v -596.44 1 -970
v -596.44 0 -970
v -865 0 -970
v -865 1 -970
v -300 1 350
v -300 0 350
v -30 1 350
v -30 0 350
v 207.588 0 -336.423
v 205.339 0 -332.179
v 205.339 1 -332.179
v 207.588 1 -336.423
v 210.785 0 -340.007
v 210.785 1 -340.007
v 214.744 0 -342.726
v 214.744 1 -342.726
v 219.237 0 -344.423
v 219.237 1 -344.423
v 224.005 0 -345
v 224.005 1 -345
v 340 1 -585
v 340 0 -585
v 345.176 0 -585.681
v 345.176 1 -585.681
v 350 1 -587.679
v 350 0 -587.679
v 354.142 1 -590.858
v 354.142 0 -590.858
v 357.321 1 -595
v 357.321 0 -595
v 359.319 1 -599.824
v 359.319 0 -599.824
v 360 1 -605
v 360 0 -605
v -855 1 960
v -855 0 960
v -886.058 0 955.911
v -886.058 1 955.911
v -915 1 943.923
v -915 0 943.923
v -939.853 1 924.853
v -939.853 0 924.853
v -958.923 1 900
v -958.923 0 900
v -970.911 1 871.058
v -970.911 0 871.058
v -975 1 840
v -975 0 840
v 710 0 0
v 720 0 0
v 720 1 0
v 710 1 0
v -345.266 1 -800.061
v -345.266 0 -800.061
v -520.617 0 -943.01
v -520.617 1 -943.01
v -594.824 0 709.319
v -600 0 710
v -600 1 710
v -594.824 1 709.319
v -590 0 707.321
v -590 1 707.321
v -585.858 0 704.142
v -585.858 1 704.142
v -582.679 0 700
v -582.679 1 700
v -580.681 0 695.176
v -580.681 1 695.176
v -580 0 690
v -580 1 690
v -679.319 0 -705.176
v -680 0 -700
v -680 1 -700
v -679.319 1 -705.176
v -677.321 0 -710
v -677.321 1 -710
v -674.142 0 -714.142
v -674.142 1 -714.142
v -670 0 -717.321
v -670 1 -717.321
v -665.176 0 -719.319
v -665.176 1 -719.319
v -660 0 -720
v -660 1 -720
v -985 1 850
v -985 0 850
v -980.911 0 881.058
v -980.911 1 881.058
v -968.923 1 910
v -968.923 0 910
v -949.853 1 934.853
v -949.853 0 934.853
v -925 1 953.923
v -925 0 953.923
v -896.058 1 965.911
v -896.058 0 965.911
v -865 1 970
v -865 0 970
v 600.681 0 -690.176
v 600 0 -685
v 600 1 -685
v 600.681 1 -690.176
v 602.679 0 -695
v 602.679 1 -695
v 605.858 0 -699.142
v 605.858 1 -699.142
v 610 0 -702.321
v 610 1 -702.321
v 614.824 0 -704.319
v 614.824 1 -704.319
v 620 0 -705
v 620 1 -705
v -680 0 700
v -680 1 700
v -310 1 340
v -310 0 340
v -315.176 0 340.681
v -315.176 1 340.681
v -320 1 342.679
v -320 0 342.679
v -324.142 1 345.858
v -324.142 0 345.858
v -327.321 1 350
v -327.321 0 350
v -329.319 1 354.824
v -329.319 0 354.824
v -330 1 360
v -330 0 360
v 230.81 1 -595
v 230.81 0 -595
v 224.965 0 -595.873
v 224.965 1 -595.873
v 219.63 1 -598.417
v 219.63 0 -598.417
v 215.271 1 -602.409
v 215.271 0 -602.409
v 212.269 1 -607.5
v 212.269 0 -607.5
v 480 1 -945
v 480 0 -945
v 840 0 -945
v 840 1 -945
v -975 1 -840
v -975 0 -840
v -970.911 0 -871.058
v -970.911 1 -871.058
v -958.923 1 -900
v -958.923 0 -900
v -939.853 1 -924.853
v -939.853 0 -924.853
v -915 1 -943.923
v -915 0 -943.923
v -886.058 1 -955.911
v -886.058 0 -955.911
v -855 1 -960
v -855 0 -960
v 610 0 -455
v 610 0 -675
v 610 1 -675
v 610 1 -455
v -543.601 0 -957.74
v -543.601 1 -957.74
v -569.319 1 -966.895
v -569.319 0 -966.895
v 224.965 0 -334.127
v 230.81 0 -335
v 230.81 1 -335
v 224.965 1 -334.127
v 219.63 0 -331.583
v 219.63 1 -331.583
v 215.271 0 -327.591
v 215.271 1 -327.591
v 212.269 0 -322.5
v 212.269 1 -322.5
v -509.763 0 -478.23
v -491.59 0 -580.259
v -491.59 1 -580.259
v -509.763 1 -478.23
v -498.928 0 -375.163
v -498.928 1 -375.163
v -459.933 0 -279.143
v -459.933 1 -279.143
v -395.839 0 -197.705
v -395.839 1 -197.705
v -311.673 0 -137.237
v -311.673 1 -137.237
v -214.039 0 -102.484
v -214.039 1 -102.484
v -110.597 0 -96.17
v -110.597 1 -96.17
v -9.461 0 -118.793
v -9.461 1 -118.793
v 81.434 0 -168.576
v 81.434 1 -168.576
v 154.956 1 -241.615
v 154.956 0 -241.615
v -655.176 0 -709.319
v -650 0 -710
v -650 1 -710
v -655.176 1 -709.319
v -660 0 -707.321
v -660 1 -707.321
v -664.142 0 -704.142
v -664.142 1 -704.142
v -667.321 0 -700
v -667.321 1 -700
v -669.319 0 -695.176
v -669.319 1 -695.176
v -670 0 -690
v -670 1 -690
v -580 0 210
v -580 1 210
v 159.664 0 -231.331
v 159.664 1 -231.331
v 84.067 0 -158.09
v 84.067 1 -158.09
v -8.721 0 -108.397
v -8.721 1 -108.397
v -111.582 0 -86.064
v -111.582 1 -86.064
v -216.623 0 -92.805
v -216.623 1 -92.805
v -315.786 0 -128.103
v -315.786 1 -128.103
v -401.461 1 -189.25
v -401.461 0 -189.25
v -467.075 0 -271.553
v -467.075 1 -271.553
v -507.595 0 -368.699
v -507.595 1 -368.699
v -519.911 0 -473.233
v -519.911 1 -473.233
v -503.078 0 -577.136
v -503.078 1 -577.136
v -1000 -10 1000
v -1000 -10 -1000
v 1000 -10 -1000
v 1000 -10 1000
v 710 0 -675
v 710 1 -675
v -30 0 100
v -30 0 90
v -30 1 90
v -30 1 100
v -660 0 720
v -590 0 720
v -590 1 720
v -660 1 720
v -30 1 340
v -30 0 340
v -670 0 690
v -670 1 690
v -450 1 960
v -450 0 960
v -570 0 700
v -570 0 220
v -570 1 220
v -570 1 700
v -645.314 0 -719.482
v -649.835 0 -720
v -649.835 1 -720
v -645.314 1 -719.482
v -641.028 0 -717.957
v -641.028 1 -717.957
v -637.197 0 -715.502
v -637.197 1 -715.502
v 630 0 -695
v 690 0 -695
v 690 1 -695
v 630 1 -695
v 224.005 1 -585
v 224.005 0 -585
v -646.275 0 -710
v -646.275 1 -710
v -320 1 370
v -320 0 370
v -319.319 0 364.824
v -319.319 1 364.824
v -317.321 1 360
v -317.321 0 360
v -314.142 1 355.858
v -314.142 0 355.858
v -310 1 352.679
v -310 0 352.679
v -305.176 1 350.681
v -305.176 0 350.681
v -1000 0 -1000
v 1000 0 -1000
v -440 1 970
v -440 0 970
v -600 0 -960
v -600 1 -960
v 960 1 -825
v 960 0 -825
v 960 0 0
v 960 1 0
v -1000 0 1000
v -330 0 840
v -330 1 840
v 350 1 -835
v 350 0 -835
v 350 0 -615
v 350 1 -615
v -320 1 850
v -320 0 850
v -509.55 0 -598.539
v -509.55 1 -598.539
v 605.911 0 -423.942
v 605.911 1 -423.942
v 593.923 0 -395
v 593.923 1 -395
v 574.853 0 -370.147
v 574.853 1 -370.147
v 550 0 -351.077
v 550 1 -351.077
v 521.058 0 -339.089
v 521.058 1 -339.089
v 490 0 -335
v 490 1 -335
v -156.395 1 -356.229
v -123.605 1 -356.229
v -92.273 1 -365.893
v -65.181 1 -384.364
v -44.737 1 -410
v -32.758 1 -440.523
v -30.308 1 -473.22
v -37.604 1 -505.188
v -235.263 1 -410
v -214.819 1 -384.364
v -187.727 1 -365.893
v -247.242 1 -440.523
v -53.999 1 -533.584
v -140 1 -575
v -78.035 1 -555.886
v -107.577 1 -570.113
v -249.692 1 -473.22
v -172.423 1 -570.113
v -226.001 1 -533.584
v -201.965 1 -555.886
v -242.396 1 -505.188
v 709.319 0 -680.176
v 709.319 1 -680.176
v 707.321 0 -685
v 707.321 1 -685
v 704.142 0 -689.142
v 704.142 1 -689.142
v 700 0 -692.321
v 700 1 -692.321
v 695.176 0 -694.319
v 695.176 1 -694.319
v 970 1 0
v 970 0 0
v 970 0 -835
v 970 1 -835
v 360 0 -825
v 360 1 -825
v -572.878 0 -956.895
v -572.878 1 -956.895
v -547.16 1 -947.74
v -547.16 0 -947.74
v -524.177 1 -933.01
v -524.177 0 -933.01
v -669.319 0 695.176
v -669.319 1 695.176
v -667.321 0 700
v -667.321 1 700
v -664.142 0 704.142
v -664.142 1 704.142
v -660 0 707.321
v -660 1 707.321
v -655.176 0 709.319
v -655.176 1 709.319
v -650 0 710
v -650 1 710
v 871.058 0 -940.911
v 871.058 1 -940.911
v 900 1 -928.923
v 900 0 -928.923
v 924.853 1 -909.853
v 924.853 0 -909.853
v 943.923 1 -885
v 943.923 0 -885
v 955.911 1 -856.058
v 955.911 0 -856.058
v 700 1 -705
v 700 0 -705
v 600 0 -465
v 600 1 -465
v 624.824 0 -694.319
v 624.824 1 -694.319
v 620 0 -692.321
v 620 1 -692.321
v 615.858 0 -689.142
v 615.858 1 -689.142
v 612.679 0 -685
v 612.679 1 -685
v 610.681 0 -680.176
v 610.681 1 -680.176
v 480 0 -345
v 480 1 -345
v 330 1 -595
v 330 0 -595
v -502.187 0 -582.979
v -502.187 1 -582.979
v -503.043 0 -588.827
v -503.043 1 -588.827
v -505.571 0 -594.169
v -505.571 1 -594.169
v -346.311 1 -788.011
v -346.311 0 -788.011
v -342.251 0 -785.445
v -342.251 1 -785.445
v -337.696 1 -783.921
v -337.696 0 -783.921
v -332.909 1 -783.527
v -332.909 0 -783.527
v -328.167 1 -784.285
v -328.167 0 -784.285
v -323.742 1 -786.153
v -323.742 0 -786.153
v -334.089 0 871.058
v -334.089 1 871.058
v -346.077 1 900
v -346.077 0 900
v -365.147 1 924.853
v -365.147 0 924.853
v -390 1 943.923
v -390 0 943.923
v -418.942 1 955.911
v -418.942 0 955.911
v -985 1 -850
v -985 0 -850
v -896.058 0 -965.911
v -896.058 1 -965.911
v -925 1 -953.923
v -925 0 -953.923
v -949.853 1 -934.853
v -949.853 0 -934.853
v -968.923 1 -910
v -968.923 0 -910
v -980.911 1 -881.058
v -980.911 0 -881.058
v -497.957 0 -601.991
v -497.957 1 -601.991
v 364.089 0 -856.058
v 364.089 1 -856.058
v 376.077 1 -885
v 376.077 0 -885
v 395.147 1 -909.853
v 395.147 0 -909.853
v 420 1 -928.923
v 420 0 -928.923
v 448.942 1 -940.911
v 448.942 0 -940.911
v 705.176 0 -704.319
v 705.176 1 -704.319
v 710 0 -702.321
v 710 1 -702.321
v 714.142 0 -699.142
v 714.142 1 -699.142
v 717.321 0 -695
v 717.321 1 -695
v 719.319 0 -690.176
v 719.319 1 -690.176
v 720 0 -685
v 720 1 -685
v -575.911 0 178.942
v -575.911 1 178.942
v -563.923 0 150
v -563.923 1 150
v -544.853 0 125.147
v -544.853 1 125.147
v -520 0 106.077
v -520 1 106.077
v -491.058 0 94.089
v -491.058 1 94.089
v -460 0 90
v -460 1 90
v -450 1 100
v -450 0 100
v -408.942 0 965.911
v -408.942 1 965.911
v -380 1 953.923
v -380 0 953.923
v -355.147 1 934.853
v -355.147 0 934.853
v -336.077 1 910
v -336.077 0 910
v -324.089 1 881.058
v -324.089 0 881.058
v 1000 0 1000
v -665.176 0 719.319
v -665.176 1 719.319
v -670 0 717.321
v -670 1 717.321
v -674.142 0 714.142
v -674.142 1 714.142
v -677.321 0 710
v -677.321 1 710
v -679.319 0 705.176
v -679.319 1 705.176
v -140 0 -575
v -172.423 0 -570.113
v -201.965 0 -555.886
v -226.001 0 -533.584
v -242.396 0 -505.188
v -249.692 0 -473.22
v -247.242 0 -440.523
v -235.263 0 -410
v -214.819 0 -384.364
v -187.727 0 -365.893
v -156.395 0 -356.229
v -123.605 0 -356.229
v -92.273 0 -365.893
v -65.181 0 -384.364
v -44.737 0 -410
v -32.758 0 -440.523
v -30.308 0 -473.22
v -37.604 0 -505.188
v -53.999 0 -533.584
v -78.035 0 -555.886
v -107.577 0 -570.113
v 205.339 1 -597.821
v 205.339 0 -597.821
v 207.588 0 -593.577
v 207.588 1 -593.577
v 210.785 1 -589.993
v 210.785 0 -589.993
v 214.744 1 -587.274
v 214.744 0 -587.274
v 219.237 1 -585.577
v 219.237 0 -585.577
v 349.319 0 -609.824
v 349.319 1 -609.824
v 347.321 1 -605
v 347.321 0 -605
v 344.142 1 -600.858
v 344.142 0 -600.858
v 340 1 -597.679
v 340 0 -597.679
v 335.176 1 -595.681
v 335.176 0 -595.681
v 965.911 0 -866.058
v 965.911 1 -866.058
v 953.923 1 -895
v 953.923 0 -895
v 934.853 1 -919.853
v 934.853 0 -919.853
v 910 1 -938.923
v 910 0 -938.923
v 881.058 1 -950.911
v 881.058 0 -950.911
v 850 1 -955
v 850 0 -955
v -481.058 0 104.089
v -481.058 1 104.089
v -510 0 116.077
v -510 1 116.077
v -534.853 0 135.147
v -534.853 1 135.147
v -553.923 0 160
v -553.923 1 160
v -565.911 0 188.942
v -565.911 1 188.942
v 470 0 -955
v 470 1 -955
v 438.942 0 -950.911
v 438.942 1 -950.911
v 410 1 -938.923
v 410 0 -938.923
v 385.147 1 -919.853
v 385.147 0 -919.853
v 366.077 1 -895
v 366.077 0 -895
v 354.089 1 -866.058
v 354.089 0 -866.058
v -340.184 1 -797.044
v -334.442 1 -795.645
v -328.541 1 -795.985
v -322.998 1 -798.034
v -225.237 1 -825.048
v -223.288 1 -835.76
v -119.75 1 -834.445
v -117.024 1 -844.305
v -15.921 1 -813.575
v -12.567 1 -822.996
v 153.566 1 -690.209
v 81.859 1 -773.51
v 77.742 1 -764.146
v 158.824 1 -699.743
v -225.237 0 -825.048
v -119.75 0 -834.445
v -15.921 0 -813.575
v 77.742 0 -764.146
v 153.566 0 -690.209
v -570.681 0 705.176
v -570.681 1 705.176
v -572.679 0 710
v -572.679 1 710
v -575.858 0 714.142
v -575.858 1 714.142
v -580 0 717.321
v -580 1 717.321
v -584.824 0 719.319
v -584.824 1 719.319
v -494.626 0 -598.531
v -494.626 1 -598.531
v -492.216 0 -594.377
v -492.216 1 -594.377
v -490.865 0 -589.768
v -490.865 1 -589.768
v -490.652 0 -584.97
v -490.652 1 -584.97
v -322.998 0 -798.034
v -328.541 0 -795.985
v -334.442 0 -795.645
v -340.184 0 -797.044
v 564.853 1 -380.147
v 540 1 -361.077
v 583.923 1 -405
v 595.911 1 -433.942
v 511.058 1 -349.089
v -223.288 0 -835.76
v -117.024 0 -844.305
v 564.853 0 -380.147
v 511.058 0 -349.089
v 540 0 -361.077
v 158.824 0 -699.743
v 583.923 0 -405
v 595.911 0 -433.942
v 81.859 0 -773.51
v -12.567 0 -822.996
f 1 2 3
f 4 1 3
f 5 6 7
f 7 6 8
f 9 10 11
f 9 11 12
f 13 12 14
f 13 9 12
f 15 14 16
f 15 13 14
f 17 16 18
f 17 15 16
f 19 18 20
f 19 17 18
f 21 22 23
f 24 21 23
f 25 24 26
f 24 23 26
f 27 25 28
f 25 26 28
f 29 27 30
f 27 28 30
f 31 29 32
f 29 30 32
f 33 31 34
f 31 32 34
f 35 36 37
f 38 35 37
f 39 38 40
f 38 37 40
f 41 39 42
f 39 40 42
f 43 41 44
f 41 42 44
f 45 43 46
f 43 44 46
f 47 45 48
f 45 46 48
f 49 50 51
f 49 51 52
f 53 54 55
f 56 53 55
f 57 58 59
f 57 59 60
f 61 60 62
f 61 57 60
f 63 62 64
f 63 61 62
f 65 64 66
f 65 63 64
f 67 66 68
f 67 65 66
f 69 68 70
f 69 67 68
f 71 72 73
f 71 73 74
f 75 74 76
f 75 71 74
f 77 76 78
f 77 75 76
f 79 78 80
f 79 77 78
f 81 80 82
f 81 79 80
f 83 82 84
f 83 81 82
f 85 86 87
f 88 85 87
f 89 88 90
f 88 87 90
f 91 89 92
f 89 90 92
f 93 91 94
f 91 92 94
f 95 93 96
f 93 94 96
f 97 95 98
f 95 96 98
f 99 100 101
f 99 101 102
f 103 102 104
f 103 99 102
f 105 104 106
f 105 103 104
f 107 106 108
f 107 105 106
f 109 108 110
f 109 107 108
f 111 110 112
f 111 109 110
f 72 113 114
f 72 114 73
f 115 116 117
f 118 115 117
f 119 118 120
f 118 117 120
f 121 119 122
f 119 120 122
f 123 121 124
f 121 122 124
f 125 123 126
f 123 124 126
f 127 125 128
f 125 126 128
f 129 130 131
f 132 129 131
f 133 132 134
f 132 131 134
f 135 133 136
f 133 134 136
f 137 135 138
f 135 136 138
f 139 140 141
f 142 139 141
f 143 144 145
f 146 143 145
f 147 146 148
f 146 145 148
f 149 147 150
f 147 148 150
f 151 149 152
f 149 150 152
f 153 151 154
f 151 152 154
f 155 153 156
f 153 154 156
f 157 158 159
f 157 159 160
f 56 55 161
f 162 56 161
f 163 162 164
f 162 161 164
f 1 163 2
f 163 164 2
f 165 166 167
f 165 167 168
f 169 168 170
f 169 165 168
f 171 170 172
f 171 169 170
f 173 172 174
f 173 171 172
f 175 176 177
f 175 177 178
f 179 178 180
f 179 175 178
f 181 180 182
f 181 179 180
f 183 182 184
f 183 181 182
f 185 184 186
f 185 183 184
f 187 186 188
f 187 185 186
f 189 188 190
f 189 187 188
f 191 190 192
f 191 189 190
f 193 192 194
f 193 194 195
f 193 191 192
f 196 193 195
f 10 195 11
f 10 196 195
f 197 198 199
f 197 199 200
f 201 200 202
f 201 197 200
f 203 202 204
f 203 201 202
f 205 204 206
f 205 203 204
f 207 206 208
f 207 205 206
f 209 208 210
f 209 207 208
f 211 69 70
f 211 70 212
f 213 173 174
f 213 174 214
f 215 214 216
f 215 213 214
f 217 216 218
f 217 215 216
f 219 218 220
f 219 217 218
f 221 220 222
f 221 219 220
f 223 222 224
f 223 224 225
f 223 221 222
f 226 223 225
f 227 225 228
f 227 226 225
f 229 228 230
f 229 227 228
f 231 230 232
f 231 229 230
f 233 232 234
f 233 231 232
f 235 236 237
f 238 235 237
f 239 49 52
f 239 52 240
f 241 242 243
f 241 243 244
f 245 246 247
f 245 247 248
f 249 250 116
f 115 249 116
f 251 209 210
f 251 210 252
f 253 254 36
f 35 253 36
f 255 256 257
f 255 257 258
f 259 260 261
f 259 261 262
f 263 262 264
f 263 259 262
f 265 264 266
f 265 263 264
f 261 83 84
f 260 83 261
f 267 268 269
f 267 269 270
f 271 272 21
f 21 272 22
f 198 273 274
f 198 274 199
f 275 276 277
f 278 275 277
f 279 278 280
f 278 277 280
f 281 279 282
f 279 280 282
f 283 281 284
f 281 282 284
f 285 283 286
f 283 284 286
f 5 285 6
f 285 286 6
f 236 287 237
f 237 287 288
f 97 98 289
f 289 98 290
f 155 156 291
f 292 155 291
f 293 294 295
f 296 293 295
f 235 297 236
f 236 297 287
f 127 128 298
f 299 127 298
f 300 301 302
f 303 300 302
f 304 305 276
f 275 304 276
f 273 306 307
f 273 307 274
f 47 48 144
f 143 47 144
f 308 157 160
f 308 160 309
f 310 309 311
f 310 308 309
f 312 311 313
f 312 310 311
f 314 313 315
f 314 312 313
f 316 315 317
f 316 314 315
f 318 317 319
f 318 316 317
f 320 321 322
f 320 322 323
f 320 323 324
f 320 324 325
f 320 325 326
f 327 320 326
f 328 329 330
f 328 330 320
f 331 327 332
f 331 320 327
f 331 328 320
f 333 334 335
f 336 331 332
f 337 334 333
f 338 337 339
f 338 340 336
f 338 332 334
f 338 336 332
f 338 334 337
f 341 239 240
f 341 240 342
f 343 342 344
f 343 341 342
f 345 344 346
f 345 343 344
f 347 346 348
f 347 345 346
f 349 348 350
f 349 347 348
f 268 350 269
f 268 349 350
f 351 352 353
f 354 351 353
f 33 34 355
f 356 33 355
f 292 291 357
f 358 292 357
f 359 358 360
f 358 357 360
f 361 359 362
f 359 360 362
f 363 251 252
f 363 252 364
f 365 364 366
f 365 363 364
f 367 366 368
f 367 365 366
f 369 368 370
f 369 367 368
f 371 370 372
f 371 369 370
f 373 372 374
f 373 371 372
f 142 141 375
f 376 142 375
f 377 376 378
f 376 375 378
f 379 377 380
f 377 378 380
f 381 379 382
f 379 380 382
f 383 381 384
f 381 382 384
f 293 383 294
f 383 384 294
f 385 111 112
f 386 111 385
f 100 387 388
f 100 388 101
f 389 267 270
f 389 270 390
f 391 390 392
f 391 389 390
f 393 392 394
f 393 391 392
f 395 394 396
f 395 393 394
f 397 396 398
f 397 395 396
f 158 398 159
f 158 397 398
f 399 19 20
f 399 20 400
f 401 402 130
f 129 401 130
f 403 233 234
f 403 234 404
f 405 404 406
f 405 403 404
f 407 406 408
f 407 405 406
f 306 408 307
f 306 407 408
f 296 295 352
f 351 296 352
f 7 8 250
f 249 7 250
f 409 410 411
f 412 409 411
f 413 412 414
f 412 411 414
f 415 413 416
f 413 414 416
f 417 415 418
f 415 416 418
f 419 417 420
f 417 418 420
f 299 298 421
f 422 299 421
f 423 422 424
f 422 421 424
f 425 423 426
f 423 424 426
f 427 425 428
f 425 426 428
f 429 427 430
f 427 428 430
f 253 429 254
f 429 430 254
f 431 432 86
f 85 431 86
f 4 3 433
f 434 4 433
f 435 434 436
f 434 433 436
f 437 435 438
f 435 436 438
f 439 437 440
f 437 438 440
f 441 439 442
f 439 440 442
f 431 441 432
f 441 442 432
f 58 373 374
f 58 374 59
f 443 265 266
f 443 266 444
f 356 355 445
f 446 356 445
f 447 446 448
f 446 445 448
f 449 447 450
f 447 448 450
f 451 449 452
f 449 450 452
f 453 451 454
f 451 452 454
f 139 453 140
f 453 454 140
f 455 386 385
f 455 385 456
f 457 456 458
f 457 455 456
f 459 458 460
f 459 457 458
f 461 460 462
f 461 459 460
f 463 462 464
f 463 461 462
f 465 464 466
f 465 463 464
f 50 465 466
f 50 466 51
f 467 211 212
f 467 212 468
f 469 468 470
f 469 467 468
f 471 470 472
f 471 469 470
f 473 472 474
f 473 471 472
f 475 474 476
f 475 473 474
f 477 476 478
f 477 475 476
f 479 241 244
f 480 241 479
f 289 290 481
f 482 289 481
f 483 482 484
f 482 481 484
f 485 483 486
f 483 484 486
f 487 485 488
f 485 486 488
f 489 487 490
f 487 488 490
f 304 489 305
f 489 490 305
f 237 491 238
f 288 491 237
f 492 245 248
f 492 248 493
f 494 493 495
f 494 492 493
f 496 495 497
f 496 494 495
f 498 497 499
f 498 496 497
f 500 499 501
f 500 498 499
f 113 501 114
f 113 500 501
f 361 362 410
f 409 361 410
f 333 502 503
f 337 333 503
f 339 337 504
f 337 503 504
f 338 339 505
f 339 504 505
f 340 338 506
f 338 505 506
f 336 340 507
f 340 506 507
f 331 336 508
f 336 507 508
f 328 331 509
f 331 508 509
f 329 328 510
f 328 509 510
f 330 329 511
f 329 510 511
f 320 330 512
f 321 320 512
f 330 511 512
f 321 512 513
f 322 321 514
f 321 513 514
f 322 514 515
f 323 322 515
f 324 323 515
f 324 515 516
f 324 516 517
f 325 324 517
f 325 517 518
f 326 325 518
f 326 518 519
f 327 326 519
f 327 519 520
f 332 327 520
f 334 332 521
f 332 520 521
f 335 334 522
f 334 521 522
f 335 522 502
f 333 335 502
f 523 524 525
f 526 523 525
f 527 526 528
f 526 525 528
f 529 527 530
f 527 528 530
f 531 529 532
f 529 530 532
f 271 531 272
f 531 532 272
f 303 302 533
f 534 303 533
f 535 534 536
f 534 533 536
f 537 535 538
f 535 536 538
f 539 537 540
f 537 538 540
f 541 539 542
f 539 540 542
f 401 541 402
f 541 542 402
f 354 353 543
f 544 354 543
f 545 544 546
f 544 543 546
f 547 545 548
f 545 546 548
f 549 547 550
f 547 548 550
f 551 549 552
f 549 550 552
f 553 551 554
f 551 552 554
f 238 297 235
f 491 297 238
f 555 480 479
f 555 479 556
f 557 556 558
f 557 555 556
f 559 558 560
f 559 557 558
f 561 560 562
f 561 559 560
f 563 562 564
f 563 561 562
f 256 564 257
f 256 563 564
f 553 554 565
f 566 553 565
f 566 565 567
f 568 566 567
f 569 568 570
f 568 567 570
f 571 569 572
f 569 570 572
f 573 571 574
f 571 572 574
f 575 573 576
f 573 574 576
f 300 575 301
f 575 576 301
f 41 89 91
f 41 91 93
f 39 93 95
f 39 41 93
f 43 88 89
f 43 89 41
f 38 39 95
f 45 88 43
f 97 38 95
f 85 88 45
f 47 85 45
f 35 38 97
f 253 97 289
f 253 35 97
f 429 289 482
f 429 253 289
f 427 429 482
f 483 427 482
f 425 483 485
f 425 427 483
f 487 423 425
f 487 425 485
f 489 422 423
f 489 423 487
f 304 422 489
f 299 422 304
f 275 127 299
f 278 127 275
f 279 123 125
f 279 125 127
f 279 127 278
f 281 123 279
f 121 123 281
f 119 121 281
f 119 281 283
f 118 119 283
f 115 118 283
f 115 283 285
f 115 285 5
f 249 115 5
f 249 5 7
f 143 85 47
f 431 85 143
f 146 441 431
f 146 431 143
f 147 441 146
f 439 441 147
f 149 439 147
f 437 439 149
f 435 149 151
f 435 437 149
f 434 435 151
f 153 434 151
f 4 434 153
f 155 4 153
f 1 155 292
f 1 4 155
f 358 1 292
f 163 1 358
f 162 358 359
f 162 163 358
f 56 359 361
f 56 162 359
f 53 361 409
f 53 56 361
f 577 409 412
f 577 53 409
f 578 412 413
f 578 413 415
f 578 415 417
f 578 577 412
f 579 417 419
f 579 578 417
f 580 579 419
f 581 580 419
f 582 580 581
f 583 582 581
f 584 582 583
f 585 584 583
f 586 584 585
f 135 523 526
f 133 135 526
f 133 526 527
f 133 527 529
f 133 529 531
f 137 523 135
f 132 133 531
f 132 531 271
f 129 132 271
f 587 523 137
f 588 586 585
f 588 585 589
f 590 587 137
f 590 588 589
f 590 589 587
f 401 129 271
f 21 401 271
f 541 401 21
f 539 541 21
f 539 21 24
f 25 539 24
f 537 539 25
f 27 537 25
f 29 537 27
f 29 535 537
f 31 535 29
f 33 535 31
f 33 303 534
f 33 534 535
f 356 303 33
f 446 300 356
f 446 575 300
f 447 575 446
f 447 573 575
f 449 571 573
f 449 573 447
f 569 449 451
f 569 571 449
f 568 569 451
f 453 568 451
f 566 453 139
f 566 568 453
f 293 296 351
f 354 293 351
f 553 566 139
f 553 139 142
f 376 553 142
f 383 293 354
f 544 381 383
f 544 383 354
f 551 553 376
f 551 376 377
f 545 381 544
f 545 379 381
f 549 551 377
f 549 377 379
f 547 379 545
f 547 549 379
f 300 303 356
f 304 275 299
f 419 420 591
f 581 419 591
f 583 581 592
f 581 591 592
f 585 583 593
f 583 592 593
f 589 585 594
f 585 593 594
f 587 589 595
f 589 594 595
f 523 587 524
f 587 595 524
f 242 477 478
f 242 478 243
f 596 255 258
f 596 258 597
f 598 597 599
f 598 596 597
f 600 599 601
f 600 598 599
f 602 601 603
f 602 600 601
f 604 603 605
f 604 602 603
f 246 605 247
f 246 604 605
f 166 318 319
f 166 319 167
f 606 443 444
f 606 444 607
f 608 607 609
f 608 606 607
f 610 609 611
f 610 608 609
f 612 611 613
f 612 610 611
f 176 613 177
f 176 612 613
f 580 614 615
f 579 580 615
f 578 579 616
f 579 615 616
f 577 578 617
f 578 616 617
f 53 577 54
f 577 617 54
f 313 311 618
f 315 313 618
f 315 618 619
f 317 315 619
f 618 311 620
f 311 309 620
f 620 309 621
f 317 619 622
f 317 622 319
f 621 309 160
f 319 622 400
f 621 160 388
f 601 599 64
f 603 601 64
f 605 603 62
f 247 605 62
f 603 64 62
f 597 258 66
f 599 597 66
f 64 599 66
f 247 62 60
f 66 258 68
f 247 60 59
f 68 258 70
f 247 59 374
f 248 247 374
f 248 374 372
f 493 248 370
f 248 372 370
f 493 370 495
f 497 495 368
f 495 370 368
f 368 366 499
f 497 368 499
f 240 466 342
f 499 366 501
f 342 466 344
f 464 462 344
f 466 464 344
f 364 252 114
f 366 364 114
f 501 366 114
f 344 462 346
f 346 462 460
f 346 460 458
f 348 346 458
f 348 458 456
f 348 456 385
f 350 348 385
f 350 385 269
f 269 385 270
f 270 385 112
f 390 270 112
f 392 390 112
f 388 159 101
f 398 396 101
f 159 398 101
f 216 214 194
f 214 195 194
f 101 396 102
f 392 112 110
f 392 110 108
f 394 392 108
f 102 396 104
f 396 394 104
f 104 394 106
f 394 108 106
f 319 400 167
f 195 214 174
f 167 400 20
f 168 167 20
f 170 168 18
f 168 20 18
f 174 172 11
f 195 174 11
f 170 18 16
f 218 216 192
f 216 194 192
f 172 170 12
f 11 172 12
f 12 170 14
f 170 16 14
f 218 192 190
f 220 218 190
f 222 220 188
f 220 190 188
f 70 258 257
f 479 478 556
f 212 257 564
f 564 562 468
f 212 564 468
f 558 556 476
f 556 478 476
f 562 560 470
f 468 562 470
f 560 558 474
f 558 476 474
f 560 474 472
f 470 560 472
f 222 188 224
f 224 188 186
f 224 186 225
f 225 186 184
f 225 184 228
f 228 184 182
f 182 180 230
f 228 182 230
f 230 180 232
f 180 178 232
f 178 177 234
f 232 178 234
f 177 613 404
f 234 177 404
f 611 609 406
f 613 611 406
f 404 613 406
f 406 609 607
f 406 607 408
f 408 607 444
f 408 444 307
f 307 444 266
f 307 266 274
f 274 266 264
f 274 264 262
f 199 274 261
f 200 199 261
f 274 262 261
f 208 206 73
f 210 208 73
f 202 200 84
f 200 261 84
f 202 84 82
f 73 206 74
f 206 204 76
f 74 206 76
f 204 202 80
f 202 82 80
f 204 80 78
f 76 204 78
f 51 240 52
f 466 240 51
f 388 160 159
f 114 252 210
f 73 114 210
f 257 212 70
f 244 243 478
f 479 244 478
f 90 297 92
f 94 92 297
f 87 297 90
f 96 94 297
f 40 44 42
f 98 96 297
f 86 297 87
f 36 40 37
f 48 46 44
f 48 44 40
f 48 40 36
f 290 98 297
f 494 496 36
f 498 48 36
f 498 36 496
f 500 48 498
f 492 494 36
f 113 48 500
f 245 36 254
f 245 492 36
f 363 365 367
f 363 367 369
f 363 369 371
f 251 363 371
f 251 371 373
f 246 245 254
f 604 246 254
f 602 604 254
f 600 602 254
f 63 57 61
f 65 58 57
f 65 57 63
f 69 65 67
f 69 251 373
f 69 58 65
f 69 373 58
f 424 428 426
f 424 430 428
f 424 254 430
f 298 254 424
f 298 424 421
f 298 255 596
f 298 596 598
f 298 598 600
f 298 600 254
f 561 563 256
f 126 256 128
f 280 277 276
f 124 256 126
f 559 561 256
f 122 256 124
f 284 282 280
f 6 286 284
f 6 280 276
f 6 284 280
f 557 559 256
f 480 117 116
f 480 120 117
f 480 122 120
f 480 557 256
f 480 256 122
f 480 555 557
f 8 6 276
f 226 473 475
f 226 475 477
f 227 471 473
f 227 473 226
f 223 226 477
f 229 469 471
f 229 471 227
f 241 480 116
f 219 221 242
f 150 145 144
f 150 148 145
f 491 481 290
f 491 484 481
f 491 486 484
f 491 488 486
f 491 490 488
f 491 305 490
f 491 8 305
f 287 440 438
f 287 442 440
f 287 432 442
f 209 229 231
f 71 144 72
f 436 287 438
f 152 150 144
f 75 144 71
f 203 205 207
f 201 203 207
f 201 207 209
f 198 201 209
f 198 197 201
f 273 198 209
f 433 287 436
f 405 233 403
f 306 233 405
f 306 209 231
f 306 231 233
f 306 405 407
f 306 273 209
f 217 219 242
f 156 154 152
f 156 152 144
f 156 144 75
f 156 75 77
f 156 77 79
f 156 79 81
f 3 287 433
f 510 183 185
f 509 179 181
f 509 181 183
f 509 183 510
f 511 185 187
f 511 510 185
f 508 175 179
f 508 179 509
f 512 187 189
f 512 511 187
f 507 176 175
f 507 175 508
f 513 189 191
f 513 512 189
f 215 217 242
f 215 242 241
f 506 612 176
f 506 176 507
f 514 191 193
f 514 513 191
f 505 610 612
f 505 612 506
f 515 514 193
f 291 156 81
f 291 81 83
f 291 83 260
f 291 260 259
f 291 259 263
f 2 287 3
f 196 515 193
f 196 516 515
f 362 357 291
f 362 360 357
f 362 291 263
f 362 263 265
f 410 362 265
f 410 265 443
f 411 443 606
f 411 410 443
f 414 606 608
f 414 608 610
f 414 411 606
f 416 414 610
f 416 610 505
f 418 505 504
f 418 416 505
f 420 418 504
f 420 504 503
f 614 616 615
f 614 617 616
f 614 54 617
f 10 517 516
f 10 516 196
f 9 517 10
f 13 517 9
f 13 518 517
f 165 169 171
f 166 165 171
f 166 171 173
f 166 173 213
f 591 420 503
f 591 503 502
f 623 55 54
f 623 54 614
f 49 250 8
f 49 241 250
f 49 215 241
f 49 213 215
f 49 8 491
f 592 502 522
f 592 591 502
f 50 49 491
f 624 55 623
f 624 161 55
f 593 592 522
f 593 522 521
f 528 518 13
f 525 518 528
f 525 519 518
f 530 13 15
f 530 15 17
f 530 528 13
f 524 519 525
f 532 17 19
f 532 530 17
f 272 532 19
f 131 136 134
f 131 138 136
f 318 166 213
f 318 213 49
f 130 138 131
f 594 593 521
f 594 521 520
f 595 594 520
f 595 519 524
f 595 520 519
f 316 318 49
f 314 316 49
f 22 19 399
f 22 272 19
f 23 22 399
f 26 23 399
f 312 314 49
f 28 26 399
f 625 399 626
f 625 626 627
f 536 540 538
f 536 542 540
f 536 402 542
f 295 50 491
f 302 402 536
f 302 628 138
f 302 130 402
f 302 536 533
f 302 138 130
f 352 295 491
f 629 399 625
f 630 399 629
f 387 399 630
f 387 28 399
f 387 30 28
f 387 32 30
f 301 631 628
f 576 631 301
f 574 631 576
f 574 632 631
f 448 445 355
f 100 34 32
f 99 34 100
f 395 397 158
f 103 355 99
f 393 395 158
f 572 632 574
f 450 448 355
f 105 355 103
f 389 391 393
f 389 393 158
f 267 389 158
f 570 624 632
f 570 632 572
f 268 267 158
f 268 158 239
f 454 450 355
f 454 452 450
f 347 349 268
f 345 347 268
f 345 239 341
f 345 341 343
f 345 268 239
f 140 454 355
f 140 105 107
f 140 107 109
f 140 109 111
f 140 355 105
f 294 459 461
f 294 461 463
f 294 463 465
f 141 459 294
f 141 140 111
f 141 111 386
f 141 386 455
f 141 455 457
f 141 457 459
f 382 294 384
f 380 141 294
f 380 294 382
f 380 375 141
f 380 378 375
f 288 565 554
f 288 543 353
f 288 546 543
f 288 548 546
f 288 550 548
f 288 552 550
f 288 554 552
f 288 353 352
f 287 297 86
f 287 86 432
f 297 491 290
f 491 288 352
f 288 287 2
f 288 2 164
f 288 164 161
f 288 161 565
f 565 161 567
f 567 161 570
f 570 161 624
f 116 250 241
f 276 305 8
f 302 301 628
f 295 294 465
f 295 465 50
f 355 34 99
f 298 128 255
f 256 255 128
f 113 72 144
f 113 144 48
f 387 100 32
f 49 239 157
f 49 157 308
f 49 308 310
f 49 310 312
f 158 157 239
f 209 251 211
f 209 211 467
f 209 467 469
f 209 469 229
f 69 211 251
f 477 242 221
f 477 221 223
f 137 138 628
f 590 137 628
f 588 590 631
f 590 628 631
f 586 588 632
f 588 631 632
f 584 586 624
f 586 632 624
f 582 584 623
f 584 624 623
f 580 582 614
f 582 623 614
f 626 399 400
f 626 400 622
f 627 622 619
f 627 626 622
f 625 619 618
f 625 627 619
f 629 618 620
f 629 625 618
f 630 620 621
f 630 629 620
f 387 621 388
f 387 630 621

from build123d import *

# Parameters (mm, degrees)
ESQUISSE2_W        = 2000
ESQUISSE2_H        = 2000
BOSS_EXTRU_2_DEPTH = 10
ESQUISSE1_R        = 110
BOSS_EXTRU_6_DEPTH = 1


with BuildPart() as part:
    # Esquisse2 → Boss.-Extru.2 (new body)
    with BuildSketch(Plane(origin=(0, 0, 0), x_dir=(1, 0, 0), z_dir=(0, 1, 0))):
        Rectangle(ESQUISSE2_W, ESQUISSE2_H)
    extrude(amount=-BOSS_EXTRU_2_DEPTH)

    # Esquisse1 → Boss.-Extru.6 (add)
    with BuildSketch(Plane(origin=(0, 0, 0), x_dir=(1, 0, 0), z_dir=(0, 1, 0))):
        with Locations(Location((-140, 465, 0), (0, 0, 90))):
            Circle(ESQUISSE1_R)
        with BuildLine():
            Line((-30, -100), (-450, -100))
            ThreePointArc((-450, -100), (-534.852813742, -135.147186258), (-570, -220))
            Line((-570, -220), (-570, -700))
            ThreePointArc((-570, -700), (-575.857864376, -714.142135624), (-590, -720))
            Line((-590, -720), (-660, -720))
            ThreePointArc((-660, -720), (-674.142135624, -714.142135624), (-680, -700))
            Line((-680, -700), (-680, 700))
            ThreePointArc((-680, 700), (-674.142135624, 714.142135624), (-660, 720))
            Line((-660, 720), (-649.834574491, 720))
            ThreePointArc((-649.834574491, 720), (-643.12759549, 718.841879754), (-637.197365306, 715.501643268))
            Line((-637.197365306, 715.501643268), (-497.957421247, 601.990819307))
            ThreePointArc((-497.957421247, 601.990819307), (-491.401573638, 592.112926645), (-491.58977759, 580.258961883))
            ThreePointArc((-491.58977759, 580.258961883), (-264.079111523, 116.425224545), (205.33854603, 332.179487179))
            ThreePointArc((205.33854603, 332.179487179), (212.682724123, 341.486202467), (224.005494464, 345))
            Line((224.005494464, 345), (480, 345))
            ThreePointArc((480, 345), (564.852813742, 380.147186258), (600, 465))
            Line((600, 465), (600, 685))
            ThreePointArc((600, 685), (605.857864376, 699.142135624), (620, 705))
            Line((620, 705), (700, 705))
            ThreePointArc((700, 705), (714.142135624, 699.142135624), (720, 685))
            Line((720, 685), (720, 0))
            Line((720, 0), (710, 0))
            Line((710, 0), (710, 675))
            ThreePointArc((710, 675), (704.142135624, 689.142135624), (690, 695))
            Line((690, 695), (630, 695))
            ThreePointArc((630, 695), (615.857864376, 689.142135624), (610, 675))
            Line((610, 675), (610, 455))
            ThreePointArc((610, 455), (574.852813742, 370.147186258), (490, 335))
            Line((490, 335), (230.809924355, 335))
            ThreePointArc((230.809924355, 335), (219.629584467, 331.583123952), (212.269428137, 322.5))
            ThreePointArc((212.269428137, 322.5), (-267.432601024, 107.004284668), (-503.077865902, 577.135914371))
            ThreePointArc((-503.077865902, 577.135914371), (-503.043324922, 588.826673493), (-509.55001808, 598.539447869))
            Line((-509.55001808, 598.539447869), (-646.274962028, 710))
            Line((-646.274962028, 710), (-650, 710))
            ThreePointArc((-650, 710), (-664.142135624, 704.142135624), (-670, 690))
            Line((-670, 690), (-670, -690))
            ThreePointArc((-670, -690), (-664.142135624, -704.142135624), (-650, -710))
            Line((-650, -710), (-600, -710))
            ThreePointArc((-600, -710), (-585.857864376, -704.142135624), (-580, -690))
            Line((-580, -690), (-580, -210))
            ThreePointArc((-580, -210), (-544.852813742, -125.147186258), (-460, -90))
            Line((-460, -90), (-30, -90))
            Line((-30, -90), (-30, -100))
        make_face()
        with BuildLine():
            Line((-30, -340), (-310, -340))
            ThreePointArc((-310, -340), (-324.142135624, -345.857864376), (-330, -360))
            Line((-330, -360), (-330, -840))
            ThreePointArc((-330, -840), (-365.147186258, -924.852813742), (-450, -960))
            Line((-450, -960), (-855, -960))
            ThreePointArc((-855, -960), (-939.852813742, -924.852813742), (-975, -840))
            Line((-975, -840), (-975, 840))
            ThreePointArc((-975, 840), (-939.852813742, 924.852813742), (-855, 960))
            Line((-855, 960), (-600, 960))
            ThreePointArc((-600, 960), (-559.758125993, 953.051278526), (-524.176744886, 933.009859606))
            Line((-524.176744886, 933.009859606), (-346.310911019, 788.010538519))
            ThreePointArc((-346.310911019, 788.010538519), (-335.314603965, 783.579609444), (-323.741717124, 786.152582721))
            ThreePointArc((-323.741717124, 786.152582721), (-15.920888477, 813.574775455), (205.33854603, 597.820512821))
            ThreePointArc((205.33854603, 597.820512821), (212.682724123, 588.513797533), (224.005494464, 585))
            Line((224.005494464, 585), (340, 585))
            ThreePointArc((340, 585), (354.142135624, 590.857864376), (360, 605))
            Line((360, 605), (360, 825))
            ThreePointArc((360, 825), (395.147186258, 909.852813742), (480, 945))
            Line((480, 945), (840, 945))
            ThreePointArc((840, 945), (924.852813742, 909.852813742), (960, 825))
            Line((960, 825), (960, 0))
            Line((960, 0), (970, 0))
            Line((970, 0), (970, 835))
            ThreePointArc((970, 835), (934.852813742, 919.852813742), (850, 955))
            Line((850, 955), (470, 955))
            ThreePointArc((470, 955), (385.147186258, 919.852813742), (350, 835))
            Line((350, 835), (350, 615))
            ThreePointArc((350, 615), (344.142135624, 600.857864376), (330, 595))
            Line((330, 595), (230.809924355, 595))
            ThreePointArc((230.809924355, 595), (219.629584467, 598.416876048), (212.269428137, 607.5))
            ThreePointArc((212.269428137, 607.5), (-12.567398976, 822.995715332), (-322.997635007, 798.034330936))
            ThreePointArc((-322.997635007, 798.034330936), (-334.44162777, 795.644755332), (-345.266298667, 800.060810349))
            Line((-345.266298667, 800.060810349), (-520.617132423, 943.009859606))
            ThreePointArc((-520.617132423, 943.009859606), (-556.198513529, 963.051278526), (-596.440387536, 970))
            Line((-596.440387536, 970), (-865, 970))
            ThreePointArc((-865, 970), (-949.852813742, 934.852813742), (-985, 850))
            Line((-985, 850), (-985, -850))
            ThreePointArc((-985, -850), (-949.852813742, -934.852813742), (-865, -970))
            Line((-865, -970), (-440, -970))
            ThreePointArc((-440, -970), (-355.147186258, -934.852813742), (-320, -850))
            Line((-320, -850), (-320, -370))
            ThreePointArc((-320, -370), (-314.142135624, -355.857864376), (-300, -350))
            Line((-300, -350), (-30, -350))
            Line((-30, -350), (-30, -340))
        make_face()
    extrude(amount=BOSS_EXTRU_6_DEPTH)


solid = part.part
